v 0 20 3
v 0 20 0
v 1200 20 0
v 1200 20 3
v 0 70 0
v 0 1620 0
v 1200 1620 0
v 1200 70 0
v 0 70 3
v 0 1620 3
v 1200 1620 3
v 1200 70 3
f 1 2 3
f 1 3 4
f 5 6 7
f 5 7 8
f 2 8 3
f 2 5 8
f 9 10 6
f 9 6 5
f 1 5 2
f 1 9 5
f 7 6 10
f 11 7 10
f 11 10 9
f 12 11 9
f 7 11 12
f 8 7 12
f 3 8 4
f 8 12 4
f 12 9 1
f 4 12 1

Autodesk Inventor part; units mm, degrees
ref_plane "YZ Plane" through (0, 0, 0) normal (1, 0, 0) x (0, 1, 0)
ref_plane "XZ Plane" through (0, 0, 0) normal (0, 1, 0) x (-1, 0, 0)
ref_plane "XY Plane" through (0, 0, 0) normal (0, 0, 1) x (1, 0, 0)
sketch "Sketch1" plane through (0, 0, 0) normal (1, 0, 0) x (0, 1, 0)
  line L0 (1620, 0) -> (70, 0)
  line L1 (70, 0) -> (20, 0)
  line L2 (20, 0) -> (0, 0)
  dimension "d0" = 180
  dimension "d1" = 50
  dimension "d2" = 1620
  dimension "d3" = 20
contour flange "Contour Flange1" sketch "Sketch1" thickness 3 bend radius 3 width 1200 along (1, 0, 0) mid plane no both sides no wall seen from (0, 845, 0) lies toward (0, 0, 1) curves L0 L1
bend "Bend1"
corner "Corner1"
sketch "Sketch2" plane through (1197.8787, 20, 0.8787) normal (0.7071068, 0, 0.7071068) x (0, 1, 0)
  line L0 (1600, 0) -> (0, 0)
  line L1 (0, 0) -> (0, -50)
  line L2 (0, -50) -> (1600, -50)
  line L3 (1600, -50) -> (1600, 0)
equation "\"d4\" = Thickness"
equation "\"d5\" = BendReliefWidth"
equation "\"d6\" = BendReliefDepth"
equation "\"d7\" = MinimumRemnant"
equation "\"d8\" = TransitionRadius"
equation "\"d10\" = BendRadius"
equation "\"d12\" = CornerReliefSize"
equation "\"d13\" = GapSize"
equation "\"d14\" = JacobiRadiusSize"
equation "\"BendRadius\" = Thickness"
equation "\"BendReliefWidth\" = Thickness"
equation "\"BendReliefDepth\" = 0.5 * Thickness"
equation "\"CornerReliefSize\" = 4 * Thickness"
equation "\"MinimumRemnant\" = 2 * Thickness"
equation "\"TransitionRadius\" = BendRadius"
equation "\"JacobiRadiusSize\" = BendRadius"
equation "\"GapSize\" = Thickness"
equation "\"Thickness\" = 3"
properties part number "GBK-RK-0011 long wall 1"
